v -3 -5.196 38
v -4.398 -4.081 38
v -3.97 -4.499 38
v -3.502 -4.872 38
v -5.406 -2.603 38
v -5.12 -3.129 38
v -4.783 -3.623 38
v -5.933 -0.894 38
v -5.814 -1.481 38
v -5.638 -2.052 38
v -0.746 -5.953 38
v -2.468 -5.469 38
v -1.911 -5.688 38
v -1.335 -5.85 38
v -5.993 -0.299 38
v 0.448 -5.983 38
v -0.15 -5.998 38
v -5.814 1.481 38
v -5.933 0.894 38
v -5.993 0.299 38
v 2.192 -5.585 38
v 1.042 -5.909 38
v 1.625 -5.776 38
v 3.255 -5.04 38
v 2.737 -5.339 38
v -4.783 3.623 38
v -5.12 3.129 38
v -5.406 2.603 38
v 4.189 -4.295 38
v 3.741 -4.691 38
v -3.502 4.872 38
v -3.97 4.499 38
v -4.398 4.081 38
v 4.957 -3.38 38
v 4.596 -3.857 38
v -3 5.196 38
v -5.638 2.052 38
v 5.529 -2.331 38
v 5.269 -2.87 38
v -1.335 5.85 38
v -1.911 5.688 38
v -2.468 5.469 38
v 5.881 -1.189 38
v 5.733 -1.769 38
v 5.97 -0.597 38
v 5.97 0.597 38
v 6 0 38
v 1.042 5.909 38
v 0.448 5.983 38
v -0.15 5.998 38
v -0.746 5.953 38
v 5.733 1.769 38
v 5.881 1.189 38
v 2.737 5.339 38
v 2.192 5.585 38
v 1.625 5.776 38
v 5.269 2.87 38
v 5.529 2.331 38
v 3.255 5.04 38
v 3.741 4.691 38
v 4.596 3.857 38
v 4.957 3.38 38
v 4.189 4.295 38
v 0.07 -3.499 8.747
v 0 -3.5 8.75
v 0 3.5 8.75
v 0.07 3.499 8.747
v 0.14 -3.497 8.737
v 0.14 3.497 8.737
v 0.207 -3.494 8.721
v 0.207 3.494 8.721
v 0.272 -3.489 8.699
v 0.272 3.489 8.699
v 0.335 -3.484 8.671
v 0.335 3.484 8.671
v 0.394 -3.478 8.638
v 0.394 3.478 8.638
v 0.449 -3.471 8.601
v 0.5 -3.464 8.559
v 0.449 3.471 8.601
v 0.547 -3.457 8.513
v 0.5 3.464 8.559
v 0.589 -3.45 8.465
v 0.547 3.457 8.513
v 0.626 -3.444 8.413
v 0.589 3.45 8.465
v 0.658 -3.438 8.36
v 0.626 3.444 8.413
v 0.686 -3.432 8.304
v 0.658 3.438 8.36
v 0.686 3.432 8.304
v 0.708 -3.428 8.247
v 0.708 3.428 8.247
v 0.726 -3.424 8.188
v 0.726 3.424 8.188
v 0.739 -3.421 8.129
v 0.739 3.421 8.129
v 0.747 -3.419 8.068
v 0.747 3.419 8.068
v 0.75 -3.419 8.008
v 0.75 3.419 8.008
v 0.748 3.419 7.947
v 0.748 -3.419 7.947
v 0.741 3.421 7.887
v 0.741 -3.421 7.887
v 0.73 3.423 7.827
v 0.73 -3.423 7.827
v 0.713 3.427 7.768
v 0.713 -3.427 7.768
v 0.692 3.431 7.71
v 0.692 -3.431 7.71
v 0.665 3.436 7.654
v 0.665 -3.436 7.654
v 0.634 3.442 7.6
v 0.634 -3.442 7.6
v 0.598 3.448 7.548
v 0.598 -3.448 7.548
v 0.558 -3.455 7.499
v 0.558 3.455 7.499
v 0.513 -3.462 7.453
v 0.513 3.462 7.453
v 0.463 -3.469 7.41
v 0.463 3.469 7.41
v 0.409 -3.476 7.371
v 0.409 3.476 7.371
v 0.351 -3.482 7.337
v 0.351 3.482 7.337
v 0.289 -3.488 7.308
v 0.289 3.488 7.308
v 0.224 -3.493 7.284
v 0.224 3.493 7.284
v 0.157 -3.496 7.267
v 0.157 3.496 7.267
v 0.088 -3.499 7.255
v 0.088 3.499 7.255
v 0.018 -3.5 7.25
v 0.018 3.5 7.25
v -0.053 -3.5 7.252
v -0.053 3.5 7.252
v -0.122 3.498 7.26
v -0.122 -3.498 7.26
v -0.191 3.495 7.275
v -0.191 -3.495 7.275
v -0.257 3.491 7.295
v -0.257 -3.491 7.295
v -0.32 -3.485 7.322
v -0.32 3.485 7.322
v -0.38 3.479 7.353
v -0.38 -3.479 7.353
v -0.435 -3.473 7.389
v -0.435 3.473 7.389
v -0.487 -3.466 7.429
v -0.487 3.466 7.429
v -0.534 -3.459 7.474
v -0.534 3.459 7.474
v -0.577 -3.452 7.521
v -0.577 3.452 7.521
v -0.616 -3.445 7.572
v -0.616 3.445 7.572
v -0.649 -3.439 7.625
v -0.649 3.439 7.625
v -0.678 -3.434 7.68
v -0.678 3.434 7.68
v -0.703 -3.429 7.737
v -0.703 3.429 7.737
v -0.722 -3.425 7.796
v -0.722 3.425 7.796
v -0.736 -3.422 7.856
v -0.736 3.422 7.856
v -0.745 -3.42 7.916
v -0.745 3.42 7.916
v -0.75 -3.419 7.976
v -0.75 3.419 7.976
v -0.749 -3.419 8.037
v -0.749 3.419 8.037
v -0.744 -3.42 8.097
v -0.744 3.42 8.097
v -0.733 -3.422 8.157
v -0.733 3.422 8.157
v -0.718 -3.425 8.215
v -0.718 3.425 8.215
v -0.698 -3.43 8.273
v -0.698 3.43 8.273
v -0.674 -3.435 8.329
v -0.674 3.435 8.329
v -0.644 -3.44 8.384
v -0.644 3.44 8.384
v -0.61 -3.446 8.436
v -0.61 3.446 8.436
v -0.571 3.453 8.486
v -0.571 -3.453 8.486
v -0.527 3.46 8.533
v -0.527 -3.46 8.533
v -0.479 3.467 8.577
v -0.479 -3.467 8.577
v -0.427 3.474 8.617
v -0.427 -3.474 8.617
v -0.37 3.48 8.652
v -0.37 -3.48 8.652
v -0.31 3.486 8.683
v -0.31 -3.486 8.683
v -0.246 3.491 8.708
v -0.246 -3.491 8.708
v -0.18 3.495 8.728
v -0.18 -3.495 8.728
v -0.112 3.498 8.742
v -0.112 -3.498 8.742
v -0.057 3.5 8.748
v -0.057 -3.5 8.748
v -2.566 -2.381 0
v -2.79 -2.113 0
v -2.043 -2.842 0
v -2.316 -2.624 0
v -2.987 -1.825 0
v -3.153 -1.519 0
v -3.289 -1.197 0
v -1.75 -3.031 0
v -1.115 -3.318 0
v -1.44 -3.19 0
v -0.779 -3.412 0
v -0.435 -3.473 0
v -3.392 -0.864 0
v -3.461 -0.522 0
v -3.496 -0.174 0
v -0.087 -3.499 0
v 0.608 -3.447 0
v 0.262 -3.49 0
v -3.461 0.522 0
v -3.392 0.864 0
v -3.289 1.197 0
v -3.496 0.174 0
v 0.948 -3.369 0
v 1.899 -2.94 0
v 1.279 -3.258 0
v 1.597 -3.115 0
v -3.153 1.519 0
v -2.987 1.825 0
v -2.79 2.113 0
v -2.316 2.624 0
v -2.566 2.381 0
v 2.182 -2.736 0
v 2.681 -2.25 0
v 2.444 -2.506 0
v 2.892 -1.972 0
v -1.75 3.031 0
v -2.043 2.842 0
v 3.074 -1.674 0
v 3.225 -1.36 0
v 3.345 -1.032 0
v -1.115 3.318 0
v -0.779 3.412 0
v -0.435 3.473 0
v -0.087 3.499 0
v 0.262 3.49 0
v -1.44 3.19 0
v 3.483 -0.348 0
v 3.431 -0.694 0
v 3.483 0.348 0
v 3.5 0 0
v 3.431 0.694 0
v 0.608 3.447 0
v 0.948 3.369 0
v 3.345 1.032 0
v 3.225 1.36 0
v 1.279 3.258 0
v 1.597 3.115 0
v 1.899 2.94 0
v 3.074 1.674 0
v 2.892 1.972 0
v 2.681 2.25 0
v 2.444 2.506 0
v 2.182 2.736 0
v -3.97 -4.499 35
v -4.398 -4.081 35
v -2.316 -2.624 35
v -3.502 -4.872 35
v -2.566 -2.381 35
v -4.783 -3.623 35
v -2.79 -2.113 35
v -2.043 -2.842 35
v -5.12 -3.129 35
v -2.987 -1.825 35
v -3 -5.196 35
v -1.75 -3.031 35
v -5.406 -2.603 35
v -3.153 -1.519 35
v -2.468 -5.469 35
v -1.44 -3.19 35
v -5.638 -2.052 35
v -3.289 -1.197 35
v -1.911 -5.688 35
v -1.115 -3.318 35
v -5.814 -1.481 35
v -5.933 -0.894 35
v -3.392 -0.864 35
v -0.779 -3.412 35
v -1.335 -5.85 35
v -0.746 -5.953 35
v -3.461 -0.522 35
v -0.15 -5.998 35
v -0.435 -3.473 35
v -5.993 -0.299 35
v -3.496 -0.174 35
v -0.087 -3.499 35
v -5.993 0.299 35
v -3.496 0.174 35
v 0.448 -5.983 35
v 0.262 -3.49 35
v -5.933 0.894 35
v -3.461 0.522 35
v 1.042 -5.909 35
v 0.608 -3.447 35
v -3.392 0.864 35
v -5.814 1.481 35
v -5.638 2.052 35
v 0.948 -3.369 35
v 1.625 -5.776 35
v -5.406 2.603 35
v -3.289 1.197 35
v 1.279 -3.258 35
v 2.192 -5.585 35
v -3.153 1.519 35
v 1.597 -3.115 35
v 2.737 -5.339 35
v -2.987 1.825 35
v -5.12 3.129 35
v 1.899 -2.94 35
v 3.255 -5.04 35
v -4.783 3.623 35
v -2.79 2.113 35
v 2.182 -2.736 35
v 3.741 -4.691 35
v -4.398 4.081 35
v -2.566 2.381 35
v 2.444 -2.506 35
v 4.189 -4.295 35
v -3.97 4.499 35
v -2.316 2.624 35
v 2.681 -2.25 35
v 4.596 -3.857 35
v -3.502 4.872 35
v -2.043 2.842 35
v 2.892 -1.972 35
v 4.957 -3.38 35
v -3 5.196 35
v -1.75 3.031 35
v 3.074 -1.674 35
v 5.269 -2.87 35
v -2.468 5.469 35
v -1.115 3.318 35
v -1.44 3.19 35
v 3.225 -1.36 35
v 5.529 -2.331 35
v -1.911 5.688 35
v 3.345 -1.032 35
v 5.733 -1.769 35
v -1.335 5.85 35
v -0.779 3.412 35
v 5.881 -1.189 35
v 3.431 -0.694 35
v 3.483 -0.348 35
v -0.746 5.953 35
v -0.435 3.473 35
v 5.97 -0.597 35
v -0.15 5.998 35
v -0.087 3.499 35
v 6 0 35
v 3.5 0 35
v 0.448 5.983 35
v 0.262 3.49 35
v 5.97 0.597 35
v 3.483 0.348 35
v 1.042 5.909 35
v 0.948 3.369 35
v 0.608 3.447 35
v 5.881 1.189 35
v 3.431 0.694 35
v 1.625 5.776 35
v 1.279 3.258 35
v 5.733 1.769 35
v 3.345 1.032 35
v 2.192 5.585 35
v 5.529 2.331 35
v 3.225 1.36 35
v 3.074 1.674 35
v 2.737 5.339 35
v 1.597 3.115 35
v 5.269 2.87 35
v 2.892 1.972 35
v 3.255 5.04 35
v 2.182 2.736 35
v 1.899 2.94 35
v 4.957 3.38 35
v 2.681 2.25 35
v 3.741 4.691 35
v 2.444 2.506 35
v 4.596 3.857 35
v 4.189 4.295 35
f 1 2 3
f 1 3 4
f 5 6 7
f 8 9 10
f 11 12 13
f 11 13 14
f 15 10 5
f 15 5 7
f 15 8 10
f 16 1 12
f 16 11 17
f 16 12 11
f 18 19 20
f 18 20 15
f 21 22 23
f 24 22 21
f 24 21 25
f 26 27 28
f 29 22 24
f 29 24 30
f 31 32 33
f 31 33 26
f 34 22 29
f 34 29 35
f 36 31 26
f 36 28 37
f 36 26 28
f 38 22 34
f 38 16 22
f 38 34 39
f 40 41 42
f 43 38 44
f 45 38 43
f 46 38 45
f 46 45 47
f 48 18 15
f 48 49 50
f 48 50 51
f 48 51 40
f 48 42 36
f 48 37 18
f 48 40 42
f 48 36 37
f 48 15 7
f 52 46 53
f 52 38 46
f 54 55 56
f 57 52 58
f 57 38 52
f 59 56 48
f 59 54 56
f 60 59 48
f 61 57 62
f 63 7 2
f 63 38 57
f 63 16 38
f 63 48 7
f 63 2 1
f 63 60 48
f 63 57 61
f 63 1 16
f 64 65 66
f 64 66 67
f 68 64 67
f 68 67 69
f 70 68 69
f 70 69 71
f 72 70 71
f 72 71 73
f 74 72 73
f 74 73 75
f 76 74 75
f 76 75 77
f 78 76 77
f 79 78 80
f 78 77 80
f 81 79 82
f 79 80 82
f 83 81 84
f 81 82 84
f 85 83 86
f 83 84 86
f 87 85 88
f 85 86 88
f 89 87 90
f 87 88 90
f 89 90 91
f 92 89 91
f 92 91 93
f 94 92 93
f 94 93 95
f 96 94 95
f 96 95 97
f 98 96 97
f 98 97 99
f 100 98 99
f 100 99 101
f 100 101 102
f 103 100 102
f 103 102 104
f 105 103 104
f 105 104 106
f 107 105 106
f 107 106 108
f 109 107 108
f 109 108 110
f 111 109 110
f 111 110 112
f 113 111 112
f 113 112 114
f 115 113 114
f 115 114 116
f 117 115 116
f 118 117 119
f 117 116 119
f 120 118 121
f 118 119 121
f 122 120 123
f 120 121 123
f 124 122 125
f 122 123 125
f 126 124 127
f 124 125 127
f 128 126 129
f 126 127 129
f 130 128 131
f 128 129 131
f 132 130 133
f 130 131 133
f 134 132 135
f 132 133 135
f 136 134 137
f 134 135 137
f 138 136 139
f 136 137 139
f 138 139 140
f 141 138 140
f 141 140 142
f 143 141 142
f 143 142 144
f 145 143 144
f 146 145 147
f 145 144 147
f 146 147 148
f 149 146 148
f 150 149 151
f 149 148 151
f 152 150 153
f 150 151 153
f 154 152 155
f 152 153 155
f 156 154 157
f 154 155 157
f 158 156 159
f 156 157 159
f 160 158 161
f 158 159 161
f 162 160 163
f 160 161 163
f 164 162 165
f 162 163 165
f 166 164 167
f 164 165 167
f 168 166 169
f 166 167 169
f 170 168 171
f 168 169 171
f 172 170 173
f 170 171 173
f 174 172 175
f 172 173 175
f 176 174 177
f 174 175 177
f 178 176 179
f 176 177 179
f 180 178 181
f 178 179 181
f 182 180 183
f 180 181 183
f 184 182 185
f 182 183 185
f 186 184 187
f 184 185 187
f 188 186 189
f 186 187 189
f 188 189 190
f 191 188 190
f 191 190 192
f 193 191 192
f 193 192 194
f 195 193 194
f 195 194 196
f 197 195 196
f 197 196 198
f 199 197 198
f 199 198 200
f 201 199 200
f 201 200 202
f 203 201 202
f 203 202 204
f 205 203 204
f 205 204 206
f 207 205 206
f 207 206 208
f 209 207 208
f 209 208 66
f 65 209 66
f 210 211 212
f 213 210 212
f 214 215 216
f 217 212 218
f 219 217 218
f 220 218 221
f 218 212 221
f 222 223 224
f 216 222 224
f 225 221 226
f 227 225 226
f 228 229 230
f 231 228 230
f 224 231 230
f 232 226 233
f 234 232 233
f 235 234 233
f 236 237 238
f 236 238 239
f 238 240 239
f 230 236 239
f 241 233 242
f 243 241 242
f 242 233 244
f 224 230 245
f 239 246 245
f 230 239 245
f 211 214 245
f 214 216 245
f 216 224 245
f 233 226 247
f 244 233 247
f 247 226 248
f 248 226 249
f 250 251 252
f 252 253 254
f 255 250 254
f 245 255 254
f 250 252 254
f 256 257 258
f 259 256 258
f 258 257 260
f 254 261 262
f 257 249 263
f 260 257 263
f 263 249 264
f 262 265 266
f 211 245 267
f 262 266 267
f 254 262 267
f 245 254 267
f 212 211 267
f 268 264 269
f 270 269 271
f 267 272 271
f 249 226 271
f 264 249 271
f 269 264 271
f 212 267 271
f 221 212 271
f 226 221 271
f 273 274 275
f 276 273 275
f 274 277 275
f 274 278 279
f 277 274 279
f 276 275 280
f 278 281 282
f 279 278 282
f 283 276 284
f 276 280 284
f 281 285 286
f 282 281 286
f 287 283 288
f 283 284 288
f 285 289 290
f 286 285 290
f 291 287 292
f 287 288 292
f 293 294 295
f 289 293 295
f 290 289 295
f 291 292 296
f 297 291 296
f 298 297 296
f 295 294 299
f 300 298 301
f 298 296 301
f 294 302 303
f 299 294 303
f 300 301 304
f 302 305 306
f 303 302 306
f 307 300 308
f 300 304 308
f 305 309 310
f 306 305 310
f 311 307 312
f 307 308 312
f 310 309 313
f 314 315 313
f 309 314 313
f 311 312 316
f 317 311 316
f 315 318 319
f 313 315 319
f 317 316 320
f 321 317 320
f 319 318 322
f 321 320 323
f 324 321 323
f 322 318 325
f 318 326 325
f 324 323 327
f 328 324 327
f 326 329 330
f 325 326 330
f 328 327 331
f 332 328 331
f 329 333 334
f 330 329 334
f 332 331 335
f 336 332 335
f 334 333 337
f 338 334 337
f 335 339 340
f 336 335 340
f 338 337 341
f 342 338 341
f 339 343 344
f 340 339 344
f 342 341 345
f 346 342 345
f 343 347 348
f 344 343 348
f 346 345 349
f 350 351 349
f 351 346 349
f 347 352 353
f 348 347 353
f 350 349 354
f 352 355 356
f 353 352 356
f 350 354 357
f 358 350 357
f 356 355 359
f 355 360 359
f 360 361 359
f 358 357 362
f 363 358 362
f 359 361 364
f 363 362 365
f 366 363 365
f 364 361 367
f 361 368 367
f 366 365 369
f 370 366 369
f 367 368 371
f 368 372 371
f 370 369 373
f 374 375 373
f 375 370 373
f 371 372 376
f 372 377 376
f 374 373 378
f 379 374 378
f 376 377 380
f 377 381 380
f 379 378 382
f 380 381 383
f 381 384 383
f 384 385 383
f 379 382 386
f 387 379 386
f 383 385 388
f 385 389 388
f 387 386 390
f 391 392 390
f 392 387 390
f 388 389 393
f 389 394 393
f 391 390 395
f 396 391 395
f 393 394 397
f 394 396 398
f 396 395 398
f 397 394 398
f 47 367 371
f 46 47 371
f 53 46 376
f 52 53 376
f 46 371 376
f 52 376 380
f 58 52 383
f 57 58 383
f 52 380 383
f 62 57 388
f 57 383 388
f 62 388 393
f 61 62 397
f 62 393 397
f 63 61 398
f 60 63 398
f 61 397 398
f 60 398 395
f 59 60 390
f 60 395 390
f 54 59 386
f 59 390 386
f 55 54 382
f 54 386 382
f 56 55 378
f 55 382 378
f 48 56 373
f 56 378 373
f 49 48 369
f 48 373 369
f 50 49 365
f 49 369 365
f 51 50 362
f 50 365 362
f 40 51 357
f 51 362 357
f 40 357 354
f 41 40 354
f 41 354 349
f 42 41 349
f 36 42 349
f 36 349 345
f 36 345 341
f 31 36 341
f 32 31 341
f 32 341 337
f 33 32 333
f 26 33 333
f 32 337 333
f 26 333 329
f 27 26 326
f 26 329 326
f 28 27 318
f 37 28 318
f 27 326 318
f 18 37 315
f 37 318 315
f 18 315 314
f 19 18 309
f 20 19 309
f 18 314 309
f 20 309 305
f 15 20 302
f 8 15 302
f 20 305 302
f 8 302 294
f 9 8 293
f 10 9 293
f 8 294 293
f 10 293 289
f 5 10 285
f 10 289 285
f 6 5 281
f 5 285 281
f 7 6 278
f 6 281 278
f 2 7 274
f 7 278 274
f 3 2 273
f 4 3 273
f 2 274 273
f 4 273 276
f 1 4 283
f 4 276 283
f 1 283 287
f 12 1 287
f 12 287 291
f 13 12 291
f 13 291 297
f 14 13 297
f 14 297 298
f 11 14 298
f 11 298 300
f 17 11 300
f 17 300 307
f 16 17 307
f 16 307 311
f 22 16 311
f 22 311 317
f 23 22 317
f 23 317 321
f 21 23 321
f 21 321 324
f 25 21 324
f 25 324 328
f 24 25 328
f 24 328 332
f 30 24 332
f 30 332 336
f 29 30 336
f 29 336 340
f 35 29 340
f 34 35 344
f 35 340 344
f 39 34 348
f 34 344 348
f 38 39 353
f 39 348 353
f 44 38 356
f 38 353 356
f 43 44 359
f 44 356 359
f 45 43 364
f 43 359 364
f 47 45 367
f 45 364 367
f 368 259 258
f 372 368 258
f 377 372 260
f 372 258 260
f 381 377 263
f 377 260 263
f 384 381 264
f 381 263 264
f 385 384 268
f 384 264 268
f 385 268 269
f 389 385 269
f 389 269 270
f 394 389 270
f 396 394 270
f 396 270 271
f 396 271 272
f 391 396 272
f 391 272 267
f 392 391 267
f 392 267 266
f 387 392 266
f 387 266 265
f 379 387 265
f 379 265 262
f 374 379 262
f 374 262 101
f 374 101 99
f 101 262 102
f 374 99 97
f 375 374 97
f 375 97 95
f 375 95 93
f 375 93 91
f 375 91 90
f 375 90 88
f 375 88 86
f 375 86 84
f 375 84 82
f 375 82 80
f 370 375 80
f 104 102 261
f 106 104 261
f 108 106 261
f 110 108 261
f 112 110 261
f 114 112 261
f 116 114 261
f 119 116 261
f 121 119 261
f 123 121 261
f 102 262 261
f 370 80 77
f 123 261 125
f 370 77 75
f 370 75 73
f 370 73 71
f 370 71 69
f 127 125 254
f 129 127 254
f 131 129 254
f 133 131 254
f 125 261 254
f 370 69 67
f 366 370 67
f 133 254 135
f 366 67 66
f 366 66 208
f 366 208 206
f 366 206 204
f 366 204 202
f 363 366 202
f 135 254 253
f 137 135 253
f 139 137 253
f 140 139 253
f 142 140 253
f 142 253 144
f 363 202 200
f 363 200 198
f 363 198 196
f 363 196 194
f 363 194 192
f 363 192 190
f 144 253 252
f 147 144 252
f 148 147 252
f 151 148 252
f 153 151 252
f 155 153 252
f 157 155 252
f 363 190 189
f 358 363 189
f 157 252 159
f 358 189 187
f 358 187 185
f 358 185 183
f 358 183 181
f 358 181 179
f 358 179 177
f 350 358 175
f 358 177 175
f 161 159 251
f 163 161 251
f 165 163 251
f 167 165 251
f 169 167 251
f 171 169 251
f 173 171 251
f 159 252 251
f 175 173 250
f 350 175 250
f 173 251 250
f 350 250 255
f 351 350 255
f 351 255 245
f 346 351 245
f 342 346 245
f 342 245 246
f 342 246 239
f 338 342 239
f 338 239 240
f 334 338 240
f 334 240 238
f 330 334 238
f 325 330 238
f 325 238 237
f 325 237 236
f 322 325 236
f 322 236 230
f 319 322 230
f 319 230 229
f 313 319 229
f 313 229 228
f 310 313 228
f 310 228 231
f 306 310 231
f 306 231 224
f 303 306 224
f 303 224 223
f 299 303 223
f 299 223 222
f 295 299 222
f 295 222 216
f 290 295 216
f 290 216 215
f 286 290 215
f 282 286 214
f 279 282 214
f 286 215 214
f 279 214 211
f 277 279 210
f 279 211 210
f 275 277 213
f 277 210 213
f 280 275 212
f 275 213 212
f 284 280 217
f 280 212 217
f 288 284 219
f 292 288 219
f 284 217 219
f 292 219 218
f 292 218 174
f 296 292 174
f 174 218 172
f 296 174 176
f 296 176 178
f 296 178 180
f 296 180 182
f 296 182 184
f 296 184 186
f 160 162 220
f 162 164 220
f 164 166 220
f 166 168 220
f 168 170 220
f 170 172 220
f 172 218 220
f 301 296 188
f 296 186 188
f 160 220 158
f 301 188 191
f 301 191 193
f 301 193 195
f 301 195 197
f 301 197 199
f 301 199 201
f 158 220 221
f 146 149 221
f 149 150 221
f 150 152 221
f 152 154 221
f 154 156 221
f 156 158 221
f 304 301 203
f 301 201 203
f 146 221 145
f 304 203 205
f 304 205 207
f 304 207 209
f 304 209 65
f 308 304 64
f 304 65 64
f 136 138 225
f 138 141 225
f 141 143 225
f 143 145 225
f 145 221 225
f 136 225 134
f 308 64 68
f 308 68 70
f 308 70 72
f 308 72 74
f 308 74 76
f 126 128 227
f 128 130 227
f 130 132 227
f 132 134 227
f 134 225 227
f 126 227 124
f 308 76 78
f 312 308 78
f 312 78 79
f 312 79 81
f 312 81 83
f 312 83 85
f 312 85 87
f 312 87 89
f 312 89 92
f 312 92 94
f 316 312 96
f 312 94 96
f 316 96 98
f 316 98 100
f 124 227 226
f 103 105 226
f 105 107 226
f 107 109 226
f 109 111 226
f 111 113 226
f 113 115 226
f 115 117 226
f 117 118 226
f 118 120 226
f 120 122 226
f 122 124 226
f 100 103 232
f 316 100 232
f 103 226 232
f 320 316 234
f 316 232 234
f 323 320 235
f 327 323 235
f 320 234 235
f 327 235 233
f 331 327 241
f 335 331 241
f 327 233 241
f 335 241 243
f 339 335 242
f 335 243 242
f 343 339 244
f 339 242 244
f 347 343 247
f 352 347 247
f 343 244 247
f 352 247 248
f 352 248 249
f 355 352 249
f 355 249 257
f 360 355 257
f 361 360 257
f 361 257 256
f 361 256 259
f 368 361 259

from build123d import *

# Parameters (mm, degrees)
SKETCH1_R           = 3.5
BOSS_EXTRUDE1_DEPTH = 35
CUT_EXTRUDE1_START  = 10
SKETCH3_R           = 0.75
CUT_EXTRUDE1_DEPTH  = 20
SKETCH4_R           = 6
BOSS_EXTRUDE2_DEPTH = 3


with BuildPart() as part:
    # Sketch1 → Boss-Extrude1 (new body)
    with BuildSketch(Plane.XY):
        Circle(SKETCH1_R)
    extrude(amount=BOSS_EXTRUDE1_DEPTH)

    # Sketch3 → Cut-Extrude1 (cut)
    with BuildSketch(Plane(origin=(0, 0, 0), x_dir=(1, 0, 0), z_dir=(0, 1, 0)).offset(CUT_EXTRUDE1_START)):
        with Locations(Location((0, -8, 0), (0, 0, 270))):
            Circle(SKETCH3_R)
    extrude(amount=-CUT_EXTRUDE1_DEPTH, mode=Mode.SUBTRACT)

    # Sketch4 → Boss-Extrude2 (add)
    with BuildSketch(Plane.XY.offset(35)):
        Circle(SKETCH4_R)
    extrude(amount=BOSS_EXTRUDE2_DEPTH)


solid = part.part
